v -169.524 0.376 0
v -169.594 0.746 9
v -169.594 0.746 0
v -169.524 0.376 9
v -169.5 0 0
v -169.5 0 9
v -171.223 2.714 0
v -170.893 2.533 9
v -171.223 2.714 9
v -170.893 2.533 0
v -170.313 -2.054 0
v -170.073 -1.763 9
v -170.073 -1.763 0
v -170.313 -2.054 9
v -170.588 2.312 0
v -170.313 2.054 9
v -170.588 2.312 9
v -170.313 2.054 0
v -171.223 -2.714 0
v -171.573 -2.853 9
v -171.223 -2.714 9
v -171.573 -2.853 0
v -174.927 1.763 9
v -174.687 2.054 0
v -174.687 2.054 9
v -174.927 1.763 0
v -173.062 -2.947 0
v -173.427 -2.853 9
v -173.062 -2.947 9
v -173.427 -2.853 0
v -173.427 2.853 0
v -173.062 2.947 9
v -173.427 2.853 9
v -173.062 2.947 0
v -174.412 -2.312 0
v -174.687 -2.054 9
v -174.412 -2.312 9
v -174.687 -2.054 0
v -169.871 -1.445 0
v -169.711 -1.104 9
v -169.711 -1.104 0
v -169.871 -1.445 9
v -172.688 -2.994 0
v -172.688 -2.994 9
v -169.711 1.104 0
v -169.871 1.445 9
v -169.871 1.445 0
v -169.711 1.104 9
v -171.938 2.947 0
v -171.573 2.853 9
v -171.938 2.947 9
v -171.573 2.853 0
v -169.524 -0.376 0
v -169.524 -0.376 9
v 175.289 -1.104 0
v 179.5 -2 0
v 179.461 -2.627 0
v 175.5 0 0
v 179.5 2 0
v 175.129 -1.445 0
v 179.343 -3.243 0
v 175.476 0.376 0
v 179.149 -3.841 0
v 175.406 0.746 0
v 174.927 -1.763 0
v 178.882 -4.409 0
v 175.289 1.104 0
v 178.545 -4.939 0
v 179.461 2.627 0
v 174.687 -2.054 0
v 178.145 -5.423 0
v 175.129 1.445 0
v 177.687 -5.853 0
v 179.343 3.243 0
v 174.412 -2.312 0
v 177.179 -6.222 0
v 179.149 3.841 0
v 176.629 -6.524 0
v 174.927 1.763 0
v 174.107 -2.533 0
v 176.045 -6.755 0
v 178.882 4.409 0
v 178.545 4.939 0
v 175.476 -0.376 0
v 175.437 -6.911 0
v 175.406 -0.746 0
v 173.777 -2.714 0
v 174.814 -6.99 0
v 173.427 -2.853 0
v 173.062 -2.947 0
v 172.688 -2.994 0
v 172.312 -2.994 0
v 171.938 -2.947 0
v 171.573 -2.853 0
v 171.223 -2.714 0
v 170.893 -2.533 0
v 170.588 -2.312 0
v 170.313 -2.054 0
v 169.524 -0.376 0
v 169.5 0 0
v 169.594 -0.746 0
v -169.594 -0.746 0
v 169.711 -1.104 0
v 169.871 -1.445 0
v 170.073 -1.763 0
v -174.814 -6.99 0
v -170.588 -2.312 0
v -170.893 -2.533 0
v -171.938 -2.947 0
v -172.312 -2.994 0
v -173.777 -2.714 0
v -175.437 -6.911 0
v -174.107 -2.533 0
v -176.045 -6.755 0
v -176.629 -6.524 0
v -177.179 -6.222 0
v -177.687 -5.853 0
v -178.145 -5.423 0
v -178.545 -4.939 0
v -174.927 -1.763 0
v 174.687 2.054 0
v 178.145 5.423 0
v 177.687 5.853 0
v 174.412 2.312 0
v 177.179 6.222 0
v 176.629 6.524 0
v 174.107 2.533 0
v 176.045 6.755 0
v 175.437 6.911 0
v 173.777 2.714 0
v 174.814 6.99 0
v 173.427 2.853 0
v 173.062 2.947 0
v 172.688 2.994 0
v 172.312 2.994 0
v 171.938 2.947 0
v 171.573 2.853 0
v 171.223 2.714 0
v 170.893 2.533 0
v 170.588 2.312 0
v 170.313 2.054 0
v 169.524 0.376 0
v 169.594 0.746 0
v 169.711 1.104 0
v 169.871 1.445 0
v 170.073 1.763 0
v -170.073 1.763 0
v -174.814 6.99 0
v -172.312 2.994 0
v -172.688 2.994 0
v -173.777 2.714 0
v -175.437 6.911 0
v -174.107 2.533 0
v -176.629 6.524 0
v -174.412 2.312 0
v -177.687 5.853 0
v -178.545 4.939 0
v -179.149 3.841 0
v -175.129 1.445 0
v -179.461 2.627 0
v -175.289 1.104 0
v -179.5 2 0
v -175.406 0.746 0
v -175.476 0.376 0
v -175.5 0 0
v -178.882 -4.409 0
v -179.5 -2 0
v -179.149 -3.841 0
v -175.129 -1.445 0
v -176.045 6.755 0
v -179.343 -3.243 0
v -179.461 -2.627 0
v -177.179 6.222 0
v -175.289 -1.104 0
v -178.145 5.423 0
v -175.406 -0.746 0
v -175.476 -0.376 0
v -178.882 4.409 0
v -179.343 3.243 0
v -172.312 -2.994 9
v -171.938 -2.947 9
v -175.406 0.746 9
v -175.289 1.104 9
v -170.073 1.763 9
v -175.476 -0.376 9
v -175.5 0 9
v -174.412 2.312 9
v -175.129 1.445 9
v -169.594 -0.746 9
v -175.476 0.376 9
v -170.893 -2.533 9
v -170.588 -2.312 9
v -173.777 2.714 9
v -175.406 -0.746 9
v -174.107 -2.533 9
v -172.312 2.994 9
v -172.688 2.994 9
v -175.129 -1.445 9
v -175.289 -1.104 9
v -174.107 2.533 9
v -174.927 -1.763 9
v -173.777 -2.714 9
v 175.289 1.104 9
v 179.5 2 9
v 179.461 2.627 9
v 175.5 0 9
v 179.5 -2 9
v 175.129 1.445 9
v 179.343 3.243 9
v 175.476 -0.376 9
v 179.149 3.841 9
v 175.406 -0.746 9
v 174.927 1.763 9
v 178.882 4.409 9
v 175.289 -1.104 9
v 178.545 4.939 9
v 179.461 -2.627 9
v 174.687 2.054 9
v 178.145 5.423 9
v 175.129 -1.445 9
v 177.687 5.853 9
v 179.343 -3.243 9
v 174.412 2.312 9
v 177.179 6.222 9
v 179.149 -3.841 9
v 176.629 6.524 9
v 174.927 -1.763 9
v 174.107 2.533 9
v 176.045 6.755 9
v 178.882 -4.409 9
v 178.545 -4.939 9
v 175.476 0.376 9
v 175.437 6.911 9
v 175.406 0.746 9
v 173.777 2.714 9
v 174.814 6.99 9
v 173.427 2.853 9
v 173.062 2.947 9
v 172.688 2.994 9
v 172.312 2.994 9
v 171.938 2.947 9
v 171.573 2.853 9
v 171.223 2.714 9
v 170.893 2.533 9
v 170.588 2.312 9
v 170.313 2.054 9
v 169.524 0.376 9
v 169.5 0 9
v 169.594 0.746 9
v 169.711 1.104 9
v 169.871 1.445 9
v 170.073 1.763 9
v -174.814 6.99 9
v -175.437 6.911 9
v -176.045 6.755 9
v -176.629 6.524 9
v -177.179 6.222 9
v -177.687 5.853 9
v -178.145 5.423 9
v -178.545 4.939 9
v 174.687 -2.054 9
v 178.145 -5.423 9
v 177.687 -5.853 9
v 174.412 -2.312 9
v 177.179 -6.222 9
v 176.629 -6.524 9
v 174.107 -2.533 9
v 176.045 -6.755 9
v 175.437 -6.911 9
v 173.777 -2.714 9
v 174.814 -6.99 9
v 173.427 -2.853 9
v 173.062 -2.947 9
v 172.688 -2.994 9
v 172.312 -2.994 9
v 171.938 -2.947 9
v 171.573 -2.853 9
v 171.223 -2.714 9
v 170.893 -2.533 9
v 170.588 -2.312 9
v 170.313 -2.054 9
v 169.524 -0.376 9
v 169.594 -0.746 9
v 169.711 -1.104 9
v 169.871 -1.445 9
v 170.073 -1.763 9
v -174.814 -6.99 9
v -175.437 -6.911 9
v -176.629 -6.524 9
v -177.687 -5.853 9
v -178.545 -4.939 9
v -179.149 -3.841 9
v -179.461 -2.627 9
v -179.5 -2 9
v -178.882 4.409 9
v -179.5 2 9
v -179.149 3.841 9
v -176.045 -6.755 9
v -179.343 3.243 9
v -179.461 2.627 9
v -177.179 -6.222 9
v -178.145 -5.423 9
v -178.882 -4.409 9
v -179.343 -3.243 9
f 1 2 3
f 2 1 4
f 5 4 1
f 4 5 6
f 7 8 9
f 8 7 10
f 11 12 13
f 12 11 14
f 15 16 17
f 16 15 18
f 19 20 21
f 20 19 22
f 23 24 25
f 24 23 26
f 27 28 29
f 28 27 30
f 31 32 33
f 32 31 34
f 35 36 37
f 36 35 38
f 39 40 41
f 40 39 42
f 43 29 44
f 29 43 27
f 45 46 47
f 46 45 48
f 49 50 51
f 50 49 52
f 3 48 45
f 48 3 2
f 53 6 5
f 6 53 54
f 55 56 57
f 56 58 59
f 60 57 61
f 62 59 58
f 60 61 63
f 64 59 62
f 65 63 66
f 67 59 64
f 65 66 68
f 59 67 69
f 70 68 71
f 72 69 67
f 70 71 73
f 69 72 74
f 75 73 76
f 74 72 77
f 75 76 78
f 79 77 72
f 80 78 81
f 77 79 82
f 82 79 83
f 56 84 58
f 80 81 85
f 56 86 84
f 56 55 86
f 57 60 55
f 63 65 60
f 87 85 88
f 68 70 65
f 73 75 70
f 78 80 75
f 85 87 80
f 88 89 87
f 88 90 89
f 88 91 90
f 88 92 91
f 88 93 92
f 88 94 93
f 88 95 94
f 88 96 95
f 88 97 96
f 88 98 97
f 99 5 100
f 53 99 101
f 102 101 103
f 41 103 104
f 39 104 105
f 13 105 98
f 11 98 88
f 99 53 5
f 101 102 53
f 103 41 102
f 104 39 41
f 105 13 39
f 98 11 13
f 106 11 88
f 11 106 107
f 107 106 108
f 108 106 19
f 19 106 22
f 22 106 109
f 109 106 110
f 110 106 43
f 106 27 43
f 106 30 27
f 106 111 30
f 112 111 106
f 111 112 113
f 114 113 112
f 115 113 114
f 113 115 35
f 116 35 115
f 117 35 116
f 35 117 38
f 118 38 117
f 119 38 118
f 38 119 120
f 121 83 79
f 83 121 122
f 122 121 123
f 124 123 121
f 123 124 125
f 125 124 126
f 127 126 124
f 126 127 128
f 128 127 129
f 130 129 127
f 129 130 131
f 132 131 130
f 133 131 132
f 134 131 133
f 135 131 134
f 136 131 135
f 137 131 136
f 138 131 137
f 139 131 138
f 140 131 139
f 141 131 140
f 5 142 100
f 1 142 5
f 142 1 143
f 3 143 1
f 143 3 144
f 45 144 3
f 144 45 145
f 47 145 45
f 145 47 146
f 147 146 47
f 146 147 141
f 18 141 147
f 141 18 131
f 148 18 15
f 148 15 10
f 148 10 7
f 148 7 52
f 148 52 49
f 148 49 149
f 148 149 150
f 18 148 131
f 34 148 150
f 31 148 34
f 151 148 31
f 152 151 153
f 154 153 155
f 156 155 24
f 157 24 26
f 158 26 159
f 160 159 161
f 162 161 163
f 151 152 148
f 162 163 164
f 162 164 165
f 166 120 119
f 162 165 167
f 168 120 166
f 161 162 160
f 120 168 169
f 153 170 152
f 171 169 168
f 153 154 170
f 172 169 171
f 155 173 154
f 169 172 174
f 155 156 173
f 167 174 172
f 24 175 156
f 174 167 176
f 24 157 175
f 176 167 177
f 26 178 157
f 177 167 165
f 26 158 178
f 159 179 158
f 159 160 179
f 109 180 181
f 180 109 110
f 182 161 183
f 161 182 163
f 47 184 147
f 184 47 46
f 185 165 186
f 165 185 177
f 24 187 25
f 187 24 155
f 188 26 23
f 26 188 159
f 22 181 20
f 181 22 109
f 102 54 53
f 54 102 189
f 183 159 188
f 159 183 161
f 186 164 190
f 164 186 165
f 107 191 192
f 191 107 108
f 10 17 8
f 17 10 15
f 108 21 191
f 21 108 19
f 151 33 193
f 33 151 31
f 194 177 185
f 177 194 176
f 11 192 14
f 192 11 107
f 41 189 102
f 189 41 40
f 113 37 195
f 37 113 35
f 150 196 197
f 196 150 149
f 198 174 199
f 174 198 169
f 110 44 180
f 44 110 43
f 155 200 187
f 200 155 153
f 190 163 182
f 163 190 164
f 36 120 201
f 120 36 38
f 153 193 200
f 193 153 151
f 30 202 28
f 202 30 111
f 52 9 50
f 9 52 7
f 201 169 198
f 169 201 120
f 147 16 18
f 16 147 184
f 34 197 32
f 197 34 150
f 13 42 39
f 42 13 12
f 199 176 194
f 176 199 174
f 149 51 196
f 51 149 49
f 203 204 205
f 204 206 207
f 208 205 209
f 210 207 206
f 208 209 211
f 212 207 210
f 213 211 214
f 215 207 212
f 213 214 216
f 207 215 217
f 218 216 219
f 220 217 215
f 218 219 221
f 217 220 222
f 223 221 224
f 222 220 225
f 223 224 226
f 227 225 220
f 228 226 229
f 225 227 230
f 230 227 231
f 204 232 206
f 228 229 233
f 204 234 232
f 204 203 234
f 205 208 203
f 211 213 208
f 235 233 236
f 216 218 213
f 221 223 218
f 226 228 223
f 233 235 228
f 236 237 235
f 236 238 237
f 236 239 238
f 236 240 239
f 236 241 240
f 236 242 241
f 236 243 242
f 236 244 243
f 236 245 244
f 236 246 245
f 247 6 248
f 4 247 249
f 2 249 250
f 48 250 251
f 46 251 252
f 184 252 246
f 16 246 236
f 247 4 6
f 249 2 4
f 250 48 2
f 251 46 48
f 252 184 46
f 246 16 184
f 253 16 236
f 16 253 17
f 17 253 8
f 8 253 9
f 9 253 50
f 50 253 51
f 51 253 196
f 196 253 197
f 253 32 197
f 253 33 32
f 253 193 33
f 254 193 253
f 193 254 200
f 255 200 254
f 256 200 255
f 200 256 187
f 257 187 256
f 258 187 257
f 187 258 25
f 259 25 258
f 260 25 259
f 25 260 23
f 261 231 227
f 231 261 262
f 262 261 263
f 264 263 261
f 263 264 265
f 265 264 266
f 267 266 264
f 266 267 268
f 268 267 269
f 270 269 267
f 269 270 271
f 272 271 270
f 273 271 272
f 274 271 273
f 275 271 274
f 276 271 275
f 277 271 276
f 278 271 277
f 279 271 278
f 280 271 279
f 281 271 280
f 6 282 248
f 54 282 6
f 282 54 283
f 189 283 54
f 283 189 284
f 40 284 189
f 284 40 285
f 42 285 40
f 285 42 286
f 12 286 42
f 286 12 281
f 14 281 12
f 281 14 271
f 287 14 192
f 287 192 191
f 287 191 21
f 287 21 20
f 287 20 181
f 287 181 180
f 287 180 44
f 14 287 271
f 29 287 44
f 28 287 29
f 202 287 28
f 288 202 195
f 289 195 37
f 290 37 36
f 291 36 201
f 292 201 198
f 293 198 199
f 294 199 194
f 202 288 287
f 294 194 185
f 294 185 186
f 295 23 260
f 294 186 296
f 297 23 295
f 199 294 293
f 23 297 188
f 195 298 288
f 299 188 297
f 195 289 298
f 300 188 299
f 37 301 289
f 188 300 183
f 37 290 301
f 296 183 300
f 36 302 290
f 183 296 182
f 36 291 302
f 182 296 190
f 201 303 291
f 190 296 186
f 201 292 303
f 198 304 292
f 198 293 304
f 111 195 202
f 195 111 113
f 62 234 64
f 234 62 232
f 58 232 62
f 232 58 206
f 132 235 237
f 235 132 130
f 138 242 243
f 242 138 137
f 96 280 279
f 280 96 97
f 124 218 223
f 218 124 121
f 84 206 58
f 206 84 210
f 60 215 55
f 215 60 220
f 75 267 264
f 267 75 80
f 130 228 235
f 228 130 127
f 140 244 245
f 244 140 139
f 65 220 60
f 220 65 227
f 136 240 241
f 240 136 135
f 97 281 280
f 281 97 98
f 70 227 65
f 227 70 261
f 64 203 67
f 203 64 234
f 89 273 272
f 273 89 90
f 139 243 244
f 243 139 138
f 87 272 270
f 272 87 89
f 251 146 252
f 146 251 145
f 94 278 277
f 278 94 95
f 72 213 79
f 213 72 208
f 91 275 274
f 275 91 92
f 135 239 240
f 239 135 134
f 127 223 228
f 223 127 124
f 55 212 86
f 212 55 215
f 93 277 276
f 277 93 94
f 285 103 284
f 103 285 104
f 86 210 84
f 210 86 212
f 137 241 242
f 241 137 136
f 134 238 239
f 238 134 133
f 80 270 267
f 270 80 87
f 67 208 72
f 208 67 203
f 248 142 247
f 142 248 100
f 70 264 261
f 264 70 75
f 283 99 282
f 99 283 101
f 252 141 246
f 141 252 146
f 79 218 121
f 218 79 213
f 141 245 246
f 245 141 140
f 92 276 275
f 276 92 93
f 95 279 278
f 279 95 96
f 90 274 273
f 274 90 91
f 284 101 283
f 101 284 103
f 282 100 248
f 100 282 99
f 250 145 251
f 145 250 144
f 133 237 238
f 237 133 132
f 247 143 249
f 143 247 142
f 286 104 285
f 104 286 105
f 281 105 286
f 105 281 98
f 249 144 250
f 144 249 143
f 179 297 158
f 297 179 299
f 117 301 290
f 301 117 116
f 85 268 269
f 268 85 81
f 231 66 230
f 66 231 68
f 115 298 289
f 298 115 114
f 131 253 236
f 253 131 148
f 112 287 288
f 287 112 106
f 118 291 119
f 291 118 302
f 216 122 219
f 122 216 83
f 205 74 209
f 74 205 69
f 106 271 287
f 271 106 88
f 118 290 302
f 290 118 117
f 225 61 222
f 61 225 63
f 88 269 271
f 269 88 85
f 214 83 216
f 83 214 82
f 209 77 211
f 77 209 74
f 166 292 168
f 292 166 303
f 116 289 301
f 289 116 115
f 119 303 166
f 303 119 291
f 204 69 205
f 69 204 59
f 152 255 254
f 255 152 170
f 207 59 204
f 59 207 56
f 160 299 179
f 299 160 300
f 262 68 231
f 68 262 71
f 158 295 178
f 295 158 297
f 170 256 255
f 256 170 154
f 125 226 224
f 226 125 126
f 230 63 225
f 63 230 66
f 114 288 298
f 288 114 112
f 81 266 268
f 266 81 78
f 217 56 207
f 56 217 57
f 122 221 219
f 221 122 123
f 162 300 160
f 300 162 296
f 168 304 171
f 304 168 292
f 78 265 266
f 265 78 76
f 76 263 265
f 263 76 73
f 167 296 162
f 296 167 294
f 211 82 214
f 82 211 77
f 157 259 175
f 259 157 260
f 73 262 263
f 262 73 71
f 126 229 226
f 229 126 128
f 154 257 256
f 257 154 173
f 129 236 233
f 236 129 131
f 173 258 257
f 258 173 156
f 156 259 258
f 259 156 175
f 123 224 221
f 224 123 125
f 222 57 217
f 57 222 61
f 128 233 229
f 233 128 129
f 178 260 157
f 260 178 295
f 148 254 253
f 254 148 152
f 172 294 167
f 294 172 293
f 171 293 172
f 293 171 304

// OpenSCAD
$fn = 50;


difference() {
	union() {
		hull() {
			translate(v = [-174.5000000000, 2.0000000000, 0]) {
				cylinder(h = 9, r = 5);
			}
			translate(v = [174.5000000000, 2.0000000000, 0]) {
				cylinder(h = 9, r = 5);
			}
			translate(v = [-174.5000000000, -2.0000000000, 0]) {
				cylinder(h = 9, r = 5);
			}
			translate(v = [174.5000000000, -2.0000000000, 0]) {
				cylinder(h = 9, r = 5);
			}
		}
	}
	union() {
		translate(v = [-172.5000000000, 0.0000000000, 0]) {
			cylinder(h = 9, r = 3.0000000000);
		}
		translate(v = [172.5000000000, 0.0000000000, 0]) {
			cylinder(h = 9, r = 3.0000000000);
		}
		translate(v = [-172.5000000000, 0.0000000000, 0]) {
			cylinder(h = 9, r = 1.5000000000);
		}
		translate(v = [172.5000000000, 0.0000000000, 0]) {
			cylinder(h = 9, r = 1.5000000000);
		}
		translate(v = [-172.5000000000, 0.0000000000, 0]) {
			cylinder(h = 9, r = 1.5000000000);
		}
		translate(v = [172.5000000000, 0.0000000000, 0]) {
			cylinder(h = 9, r = 1.5000000000);
		}
		translate(v = [-172.5000000000, 0.0000000000, 0]) {
			cylinder(h = 9, r = 1.5000000000);
		}
		translate(v = [172.5000000000, 0.0000000000, 0]) {
			cylinder(h = 9, r = 1.5000000000);
		}
	}
}
